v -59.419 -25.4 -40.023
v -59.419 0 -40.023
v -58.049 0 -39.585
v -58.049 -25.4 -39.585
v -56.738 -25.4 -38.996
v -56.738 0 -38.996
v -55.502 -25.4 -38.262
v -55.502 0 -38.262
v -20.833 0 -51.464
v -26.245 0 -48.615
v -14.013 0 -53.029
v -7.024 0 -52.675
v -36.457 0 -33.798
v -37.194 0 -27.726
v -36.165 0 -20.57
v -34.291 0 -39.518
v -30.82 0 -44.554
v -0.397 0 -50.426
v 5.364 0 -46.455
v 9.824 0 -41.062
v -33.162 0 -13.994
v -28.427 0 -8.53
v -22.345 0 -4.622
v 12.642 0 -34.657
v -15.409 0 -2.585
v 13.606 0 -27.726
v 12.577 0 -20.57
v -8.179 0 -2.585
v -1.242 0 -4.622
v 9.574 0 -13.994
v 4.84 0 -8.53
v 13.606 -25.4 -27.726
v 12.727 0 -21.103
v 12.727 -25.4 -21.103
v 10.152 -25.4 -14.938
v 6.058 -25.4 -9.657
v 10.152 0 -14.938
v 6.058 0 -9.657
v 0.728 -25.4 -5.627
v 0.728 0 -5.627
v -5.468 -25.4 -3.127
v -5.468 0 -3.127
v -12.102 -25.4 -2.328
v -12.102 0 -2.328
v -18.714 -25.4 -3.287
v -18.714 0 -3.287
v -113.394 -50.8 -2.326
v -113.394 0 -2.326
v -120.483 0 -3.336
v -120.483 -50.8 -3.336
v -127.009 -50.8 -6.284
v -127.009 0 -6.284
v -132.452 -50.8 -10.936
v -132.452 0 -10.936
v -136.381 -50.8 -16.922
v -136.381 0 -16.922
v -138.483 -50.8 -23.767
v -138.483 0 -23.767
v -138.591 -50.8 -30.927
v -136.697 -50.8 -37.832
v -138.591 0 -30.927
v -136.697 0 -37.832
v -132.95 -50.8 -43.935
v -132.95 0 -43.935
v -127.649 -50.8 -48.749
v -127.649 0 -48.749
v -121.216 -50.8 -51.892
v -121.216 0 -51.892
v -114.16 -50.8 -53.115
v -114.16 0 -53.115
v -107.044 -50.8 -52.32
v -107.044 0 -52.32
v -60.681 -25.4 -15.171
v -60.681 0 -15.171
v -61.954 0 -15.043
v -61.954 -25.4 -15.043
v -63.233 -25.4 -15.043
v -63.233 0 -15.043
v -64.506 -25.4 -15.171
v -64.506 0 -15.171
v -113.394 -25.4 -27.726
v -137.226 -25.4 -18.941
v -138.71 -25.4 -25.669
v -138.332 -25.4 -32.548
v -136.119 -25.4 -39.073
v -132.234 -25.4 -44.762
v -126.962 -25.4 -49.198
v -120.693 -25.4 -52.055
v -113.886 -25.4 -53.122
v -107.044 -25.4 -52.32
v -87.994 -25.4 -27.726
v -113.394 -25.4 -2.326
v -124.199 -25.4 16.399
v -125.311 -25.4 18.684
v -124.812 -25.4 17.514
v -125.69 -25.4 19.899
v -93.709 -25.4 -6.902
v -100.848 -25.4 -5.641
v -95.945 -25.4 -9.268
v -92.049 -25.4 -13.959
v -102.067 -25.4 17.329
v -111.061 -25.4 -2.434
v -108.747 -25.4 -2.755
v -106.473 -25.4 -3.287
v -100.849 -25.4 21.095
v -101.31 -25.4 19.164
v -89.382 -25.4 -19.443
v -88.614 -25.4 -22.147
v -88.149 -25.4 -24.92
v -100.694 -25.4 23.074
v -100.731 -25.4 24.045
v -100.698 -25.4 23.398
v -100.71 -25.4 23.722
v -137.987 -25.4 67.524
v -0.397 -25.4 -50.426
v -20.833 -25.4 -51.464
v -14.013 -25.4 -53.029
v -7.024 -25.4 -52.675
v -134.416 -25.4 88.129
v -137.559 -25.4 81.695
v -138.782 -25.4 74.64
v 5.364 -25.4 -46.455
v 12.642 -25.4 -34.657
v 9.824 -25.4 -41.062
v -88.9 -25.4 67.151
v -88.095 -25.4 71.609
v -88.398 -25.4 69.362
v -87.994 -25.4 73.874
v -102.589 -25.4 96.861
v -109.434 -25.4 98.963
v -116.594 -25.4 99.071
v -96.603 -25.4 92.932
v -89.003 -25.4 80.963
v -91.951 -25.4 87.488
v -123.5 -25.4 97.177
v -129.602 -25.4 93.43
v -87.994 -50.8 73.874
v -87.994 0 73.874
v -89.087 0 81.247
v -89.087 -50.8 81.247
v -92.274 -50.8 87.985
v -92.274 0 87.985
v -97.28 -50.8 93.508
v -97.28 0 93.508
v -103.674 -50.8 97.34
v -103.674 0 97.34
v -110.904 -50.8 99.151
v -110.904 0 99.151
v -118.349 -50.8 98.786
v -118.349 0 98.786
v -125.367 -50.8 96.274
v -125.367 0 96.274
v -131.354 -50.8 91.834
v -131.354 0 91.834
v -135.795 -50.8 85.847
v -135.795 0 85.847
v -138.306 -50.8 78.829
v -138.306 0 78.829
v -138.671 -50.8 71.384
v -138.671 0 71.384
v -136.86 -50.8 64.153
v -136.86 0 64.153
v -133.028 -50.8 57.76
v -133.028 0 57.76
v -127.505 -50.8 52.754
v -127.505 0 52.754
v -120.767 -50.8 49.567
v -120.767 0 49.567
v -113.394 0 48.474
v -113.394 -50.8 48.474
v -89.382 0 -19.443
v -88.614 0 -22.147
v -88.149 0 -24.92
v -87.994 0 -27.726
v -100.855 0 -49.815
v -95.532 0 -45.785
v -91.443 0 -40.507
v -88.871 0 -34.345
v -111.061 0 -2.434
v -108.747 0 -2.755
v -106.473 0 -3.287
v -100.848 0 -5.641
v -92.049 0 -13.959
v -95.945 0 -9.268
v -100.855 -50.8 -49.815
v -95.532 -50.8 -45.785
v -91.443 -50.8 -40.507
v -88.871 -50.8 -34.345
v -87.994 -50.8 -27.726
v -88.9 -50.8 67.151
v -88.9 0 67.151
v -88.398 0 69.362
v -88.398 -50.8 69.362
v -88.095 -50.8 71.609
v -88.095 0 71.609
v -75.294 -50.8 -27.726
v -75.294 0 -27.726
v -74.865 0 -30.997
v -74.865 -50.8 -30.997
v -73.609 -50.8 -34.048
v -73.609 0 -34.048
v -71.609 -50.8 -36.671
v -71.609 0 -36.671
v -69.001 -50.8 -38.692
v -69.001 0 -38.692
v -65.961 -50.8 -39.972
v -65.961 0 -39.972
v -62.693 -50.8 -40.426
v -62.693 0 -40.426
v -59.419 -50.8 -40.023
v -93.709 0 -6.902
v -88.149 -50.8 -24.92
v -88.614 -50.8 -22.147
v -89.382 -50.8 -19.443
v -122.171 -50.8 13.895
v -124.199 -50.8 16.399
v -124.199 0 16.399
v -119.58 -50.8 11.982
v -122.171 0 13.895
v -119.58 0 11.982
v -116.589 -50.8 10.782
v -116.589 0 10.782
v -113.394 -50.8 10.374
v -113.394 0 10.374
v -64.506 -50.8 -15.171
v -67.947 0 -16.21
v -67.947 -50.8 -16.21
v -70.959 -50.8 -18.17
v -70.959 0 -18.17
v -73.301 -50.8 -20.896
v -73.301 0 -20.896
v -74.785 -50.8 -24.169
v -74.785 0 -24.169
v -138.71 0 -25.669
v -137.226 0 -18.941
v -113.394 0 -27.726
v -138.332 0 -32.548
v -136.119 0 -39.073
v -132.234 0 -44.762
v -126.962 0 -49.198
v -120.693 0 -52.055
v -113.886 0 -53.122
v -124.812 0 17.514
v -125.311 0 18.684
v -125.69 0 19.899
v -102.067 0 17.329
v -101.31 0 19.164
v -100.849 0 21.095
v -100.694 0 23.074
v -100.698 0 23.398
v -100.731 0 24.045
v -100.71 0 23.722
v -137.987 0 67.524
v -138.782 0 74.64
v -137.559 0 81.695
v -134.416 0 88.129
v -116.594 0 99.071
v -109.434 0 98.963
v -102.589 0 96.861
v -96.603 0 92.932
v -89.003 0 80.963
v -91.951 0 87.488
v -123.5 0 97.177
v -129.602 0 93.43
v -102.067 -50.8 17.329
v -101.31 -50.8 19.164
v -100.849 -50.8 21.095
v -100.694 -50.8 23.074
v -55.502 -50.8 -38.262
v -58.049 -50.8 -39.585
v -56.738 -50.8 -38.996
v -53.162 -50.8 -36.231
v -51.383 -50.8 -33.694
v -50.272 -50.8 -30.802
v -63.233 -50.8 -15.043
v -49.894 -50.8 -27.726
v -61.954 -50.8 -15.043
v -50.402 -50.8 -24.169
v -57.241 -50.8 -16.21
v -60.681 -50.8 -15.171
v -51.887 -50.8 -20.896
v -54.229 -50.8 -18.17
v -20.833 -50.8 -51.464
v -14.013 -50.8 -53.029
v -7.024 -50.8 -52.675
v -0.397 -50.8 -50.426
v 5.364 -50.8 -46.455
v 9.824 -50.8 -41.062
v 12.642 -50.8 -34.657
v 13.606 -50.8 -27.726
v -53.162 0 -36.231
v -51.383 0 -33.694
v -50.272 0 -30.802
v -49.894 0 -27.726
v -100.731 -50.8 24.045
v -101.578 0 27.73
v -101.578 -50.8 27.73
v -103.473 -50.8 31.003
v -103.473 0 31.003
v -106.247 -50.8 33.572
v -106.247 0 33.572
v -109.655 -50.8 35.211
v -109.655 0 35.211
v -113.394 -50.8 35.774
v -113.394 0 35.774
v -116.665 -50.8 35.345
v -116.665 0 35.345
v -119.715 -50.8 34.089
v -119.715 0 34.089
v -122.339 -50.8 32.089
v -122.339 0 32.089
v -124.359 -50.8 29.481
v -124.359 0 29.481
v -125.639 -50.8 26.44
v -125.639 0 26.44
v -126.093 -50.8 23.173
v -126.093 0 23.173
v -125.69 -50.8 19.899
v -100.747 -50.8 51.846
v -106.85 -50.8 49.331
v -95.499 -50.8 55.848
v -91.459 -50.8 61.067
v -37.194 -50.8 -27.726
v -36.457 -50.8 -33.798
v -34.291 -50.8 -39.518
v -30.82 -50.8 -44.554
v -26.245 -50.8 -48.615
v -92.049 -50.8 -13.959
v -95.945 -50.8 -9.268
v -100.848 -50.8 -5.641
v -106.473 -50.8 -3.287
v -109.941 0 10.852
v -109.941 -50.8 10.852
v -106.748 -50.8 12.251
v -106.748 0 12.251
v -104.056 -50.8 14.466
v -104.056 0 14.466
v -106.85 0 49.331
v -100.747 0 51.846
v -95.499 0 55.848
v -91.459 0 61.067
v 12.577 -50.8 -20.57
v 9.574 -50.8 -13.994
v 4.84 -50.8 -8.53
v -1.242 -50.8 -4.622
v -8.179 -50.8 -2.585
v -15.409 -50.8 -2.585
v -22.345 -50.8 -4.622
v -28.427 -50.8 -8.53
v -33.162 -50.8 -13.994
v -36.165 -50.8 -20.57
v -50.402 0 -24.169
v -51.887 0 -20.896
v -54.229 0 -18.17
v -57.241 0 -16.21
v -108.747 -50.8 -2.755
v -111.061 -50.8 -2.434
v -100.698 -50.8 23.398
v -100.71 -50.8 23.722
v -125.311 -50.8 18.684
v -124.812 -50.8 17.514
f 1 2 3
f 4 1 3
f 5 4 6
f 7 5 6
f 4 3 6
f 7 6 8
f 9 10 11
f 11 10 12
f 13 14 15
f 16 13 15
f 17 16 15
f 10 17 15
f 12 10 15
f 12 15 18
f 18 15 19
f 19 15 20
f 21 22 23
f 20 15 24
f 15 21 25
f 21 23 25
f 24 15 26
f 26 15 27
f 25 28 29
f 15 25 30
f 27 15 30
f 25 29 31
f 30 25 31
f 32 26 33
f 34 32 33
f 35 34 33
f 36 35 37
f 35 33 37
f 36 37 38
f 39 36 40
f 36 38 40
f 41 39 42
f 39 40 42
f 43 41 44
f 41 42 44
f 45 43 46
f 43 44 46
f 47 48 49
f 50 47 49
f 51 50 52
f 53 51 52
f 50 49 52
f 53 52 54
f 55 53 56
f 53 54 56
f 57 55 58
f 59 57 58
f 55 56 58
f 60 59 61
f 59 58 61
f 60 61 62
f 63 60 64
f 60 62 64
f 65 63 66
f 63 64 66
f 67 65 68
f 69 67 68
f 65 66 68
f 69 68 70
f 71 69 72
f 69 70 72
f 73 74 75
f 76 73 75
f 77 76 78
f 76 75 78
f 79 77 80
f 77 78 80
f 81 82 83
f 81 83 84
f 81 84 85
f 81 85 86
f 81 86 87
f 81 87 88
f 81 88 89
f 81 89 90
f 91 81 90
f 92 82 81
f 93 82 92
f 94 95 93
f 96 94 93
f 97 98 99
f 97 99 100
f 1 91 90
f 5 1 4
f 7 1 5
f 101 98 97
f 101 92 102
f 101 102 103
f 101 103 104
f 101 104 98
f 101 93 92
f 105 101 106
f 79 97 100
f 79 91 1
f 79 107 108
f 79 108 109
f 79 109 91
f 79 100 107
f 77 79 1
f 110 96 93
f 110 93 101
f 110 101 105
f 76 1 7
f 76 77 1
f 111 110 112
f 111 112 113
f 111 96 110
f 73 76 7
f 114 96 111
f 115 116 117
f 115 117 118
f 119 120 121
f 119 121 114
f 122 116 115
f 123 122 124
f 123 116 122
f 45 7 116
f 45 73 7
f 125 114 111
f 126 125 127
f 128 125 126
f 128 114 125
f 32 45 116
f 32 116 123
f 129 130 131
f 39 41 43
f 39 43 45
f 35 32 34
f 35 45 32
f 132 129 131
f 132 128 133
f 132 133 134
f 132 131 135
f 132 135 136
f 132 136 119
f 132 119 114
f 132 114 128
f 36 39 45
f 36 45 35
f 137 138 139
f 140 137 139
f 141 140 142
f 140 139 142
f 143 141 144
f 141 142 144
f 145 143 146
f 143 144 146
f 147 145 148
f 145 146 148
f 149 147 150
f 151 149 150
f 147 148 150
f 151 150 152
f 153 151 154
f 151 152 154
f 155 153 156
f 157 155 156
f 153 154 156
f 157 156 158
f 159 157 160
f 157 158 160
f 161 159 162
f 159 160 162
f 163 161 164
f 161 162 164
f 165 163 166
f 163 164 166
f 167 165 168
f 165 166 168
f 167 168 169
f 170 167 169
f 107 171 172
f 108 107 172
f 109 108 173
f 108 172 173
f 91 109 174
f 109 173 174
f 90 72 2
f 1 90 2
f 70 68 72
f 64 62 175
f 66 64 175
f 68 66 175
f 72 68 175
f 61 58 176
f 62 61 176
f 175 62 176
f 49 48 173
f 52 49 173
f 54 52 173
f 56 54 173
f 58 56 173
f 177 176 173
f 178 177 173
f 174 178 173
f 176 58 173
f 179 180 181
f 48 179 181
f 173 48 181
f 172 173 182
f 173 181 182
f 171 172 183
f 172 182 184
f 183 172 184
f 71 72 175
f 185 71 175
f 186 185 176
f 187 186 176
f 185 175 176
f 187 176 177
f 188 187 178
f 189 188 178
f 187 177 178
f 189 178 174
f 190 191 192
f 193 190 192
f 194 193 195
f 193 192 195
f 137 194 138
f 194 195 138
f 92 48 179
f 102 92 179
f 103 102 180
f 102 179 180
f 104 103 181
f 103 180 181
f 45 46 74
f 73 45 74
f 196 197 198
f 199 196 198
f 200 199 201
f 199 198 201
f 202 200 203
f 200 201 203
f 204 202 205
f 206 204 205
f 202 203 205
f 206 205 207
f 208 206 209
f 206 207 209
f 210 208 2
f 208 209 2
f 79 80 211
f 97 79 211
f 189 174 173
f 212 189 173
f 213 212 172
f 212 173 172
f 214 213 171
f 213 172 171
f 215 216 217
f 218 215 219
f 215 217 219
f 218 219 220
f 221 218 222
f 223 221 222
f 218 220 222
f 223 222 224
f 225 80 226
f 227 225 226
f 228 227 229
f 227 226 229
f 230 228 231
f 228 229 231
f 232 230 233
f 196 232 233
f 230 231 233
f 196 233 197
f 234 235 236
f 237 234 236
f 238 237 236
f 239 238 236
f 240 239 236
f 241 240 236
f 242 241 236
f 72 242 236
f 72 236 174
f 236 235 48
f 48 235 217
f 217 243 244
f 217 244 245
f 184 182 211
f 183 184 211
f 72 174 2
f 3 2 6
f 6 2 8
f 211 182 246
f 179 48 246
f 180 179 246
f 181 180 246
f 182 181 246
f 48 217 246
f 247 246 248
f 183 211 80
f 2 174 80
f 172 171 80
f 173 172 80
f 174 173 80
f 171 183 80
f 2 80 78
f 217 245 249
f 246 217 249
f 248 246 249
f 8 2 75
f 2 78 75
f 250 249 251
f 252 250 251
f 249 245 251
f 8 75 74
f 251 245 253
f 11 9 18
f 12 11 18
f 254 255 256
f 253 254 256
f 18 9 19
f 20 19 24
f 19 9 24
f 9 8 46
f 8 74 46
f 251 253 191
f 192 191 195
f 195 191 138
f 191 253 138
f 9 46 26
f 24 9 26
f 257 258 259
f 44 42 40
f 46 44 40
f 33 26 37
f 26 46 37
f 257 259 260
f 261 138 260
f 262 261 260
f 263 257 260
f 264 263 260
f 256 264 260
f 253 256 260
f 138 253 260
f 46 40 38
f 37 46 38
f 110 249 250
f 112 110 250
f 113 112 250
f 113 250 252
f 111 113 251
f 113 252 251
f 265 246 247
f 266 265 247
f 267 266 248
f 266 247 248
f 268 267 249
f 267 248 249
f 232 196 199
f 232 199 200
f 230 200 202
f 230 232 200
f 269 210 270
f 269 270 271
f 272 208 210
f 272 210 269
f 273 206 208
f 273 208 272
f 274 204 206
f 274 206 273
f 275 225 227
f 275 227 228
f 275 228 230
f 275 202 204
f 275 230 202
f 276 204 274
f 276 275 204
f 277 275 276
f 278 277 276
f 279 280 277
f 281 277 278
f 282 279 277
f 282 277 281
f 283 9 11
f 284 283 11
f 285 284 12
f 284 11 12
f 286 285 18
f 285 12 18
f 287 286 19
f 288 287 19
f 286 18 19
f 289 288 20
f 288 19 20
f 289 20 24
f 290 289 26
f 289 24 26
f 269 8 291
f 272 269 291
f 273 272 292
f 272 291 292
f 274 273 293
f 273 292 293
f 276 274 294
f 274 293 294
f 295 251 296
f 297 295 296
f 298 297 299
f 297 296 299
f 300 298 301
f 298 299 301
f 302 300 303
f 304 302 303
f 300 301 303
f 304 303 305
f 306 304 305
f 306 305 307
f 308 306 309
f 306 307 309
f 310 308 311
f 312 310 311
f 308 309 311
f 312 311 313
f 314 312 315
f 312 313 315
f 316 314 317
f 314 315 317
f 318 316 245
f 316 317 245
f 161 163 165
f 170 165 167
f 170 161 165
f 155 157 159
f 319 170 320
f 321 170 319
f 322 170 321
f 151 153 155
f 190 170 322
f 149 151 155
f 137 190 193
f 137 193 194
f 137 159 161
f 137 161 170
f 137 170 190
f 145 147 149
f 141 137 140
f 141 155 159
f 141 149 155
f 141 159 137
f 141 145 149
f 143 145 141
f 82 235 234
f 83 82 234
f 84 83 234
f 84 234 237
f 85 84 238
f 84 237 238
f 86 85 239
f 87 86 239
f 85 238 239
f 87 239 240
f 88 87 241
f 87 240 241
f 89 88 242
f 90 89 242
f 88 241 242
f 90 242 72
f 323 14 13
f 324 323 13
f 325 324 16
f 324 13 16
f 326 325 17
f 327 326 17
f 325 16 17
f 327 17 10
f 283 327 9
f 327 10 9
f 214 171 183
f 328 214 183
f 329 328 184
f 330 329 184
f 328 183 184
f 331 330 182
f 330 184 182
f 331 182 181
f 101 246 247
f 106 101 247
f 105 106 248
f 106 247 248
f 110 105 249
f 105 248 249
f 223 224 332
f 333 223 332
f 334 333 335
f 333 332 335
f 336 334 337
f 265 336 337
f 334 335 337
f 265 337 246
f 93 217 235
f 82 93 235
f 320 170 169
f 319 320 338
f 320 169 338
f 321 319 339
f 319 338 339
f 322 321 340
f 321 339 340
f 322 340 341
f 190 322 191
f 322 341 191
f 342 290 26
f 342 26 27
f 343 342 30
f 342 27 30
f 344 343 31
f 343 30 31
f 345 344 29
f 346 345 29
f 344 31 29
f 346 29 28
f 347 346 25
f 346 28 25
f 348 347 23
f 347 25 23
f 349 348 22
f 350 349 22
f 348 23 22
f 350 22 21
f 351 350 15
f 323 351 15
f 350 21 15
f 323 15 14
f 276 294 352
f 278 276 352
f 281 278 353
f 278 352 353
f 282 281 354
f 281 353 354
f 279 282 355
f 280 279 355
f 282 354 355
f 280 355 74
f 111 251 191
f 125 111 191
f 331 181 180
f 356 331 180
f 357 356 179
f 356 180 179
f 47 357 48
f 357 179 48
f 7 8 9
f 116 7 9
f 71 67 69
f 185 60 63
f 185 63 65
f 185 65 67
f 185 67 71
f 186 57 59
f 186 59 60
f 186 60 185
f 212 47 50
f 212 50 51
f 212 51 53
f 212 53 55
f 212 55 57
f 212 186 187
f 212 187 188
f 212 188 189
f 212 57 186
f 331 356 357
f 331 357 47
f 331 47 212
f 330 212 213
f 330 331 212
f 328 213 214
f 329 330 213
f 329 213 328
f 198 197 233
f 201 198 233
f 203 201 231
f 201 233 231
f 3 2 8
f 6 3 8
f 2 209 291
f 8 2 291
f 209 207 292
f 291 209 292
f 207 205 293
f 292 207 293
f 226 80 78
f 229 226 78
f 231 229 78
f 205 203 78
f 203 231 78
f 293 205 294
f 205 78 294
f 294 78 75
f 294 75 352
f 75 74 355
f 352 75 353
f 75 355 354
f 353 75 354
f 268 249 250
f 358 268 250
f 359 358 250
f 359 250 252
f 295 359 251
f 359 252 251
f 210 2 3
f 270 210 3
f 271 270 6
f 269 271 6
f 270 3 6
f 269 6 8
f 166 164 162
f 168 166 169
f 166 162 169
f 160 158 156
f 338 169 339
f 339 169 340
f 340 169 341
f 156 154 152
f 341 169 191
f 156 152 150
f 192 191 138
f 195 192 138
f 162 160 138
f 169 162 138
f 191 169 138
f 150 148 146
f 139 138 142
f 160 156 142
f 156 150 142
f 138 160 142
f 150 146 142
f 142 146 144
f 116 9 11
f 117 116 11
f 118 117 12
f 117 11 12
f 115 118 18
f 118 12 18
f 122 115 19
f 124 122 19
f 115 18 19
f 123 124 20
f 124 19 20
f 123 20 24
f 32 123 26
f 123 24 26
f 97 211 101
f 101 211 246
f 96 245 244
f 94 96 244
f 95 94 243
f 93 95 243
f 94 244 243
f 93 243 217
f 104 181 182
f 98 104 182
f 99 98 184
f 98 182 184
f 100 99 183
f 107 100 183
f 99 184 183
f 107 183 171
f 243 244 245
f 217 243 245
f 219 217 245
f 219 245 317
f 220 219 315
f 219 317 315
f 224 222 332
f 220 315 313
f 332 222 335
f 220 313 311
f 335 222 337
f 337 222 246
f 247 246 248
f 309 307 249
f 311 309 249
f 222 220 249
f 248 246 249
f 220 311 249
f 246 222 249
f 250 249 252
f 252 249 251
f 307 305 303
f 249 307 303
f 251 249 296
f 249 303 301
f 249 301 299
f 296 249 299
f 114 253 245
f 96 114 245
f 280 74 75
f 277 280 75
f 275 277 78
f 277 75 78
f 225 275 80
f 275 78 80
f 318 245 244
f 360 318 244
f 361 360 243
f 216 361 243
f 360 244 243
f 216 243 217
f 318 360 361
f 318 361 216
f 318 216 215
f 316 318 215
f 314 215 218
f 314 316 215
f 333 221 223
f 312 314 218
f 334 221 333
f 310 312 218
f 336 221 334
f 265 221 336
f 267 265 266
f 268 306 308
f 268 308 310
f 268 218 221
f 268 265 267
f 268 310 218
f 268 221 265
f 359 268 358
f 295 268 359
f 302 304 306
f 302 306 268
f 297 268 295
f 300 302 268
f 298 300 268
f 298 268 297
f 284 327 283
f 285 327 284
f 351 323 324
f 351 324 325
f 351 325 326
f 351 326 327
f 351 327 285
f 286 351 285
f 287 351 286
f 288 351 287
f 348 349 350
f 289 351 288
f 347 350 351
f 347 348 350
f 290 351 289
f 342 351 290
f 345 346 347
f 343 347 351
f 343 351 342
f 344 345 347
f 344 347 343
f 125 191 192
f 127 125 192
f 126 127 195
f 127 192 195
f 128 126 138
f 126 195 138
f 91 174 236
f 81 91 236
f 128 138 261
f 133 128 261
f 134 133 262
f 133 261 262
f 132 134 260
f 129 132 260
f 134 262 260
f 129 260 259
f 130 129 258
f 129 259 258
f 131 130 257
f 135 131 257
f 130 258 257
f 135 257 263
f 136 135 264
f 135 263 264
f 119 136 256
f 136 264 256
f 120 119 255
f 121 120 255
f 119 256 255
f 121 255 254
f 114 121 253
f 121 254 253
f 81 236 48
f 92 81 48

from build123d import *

# Parameters (mm, degrees)
F1_DEPTH = 50.8
F2_DEPTH = 25.4


with BuildPart() as f1:
    # F0 (on Front) → F1 (new body)
    with BuildSketch(Plane.XZ):
        with BuildLine():
            ThreePointArc((-137.9871743623, 67.5235991138), (-128.9479899805, 53.7931359717), (-113.3937301139, 48.4735991138))
            ThreePointArc((-113.3937301139, 48.4735991138), (-97.9925024501, 53.6755252836), (-88.8996251196, 67.1505923067))
            ThreePointArc((-88.8996251196, 67.1505923067), (-88.221222622, 70.4817166612), (-87.9937301139, 73.8735991138))
            ThreePointArc((-87.9937301139, 73.8735991138), (-116.5942391429, 99.071153399), (-137.9871743623, 67.5235991138))
        make_face()
    extrude(amount=F1_DEPTH)


with BuildPart() as f1b:
    # F0 (on Front) → F1, piece 2 (new body)
    with BuildSketch(Plane.XZ):
        with BuildLine():
            Line((-113.3937301139, 23.0735991138), (-113.3937301139, 35.7735991138))
            ThreePointArc((-113.3937301139, 35.7735991138), (-123.4339616849, 30.8507290471), (-125.6904522381, 19.8985991138))
            ThreePointArc((-125.6904522381, 19.8985991138), (-125.0762783357, 18.0928293896), (-124.1985960163, 16.3994045683))
            ThreePointArc((-124.1985960163, 16.3994045683), (-119.5795093401, 11.9818843968), (-113.3937301139, 10.3735991138))
            Line((-113.3937301139, 10.3735991138), (-113.3937301139, 23.0735991138))
        make_face()
        with BuildLine():
            ThreePointArc((-100.73095144, 24.0452143962), (-104.7638261192, 32.3910428106), (-113.3937301139, 35.7735991138))
            Line((-113.3937301139, 35.7735991138), (-113.3937301139, 23.0735991138))
            Line((-113.3937301139, 23.0735991138), (-113.3937301139, 10.3735991138))
            ThreePointArc((-113.3937301139, 10.3735991138), (-106.7479444034, 12.2512365117), (-102.0672572423, 17.3289483594))
            ThreePointArc((-102.0672572423, 17.3289483594), (-101.0418839873, 20.1203132716), (-100.6937301139, 23.0735991138))
            ThreePointArc((-100.6937301139, 23.0735991138), (-100.7030388569, 23.5597630995), (-100.73095144, 24.0452143962))
        make_face()
    extrude(amount=F1_DEPTH)


with BuildPart() as f1c:
    # F0 (on Front) → F1, piece 3 (new body)
    with BuildSketch(Plane.XZ):
        with BuildLine():
            Line((-113.3937301139, -27.7263897808), (-113.3937301139, -2.3263897808))
            ThreePointArc((-113.3937301139, -2.3263897808), (-127.919833657, -6.890067748), (-137.2260585632, -18.94116806))
            ThreePointArc((-137.2260585632, -18.94116806), (-132.2336289319, -44.7621818823), (-107.0437301139, -52.3198340292))
            ThreePointArc((-107.0437301139, -52.3198340292), (-93.3132669718, -43.2806496474), (-87.9937301139, -27.7263897808))
            Line((-87.9937301139, -27.7263897808), (-113.3937301139, -27.7263897808))
        make_face()
        with BuildLine():
            ThreePointArc((-106.473283211, -3.2873346709), (-109.9003077082, -2.5677729687), (-113.3937301139, -2.3263897808))
            Line((-113.3937301139, -2.3263897808), (-113.3937301139, -27.7263897808))
            Line((-113.3937301139, -27.7263897808), (-87.9937301139, -27.7263897808))
            ThreePointArc((-87.9937301139, -27.7263897808), (-88.3432635278, -23.5270893845), (-89.3822438003, -19.4433634609))
            ThreePointArc((-89.3822438003, -19.4433634609), (-95.945221877, -9.2680702389), (-106.473283211, -3.2873346709))
        make_face()
    extrude(amount=F1_DEPTH)


with BuildPart() as f1d:
    # F0 (on Front) → F1, piece 4 (new body)
    with BuildSketch(Plane.XZ):
        with BuildLine():
            ThreePointArc((-60.6812406189, -15.1712161885), (-62.5937301139, -15.0263897808), (-64.5062196088, -15.1712161885))
            ThreePointArc((-64.5062196088, -15.1712161885), (-72.2264508247, -19.4498753147), (-75.2937301139, -27.7263897808))
            Line((-75.2937301139, -27.7263897808), (-62.5937301139, -27.7263897808))
            Line((-62.5937301139, -27.7263897808), (-49.8937301139, -27.7263897808))
            ThreePointArc((-49.8937301139, -27.7263897808), (-52.961009403, -19.4498753147), (-60.6812406189, -15.1712161885))
        make_face()
        with BuildLine():
            ThreePointArc((-75.2937301139, -27.7263897808), (-70.3708600472, -37.7666213518), (-59.4187301139, -40.023111905))
            ThreePointArc((-59.4187301139, -40.023111905), (-57.3852437316, -39.309207642), (-55.5017480057, -38.2617488054))
            ThreePointArc((-55.5017480057, -38.2617488054), (-51.3830616955, -33.6938778296), (-49.8937301139, -27.7263897808))
            Line((-49.8937301139, -27.7263897808), (-62.5937301139, -27.7263897808))
            Line((-62.5937301139, -27.7263897808), (-75.2937301139, -27.7263897808))
        make_face()
    extrude(amount=F1_DEPTH)


with BuildPart() as f1e:
    # F0 (on Front) → F1, piece 5 (new body)
    with BuildSketch(Plane.XZ):
        with BuildLine():
            ThreePointArc((13.6062698861, -27.7263897808), (3.5258757666, -7.4663385551), (-18.7141770167, -3.2873346709))
            ThreePointArc((-18.7141770167, -3.2873346709), (-32.0537813395, -12.4067839003), (-37.1937301139, -27.7263897808))
            ThreePointArc((-37.1937301139, -27.7263897808), (-32.7072718404, -42.1410965919), (-20.8328031491, -51.4636002037))
            ThreePointArc((-20.8328031491, -51.4636002037), (2.6209766973, -48.6399315073), (13.6062698861, -27.7263897808))
        make_face()
    extrude(amount=F1_DEPTH)


with BuildPart() as f2:
    # F0 (on Front) → F2 (new body)
    with BuildSketch(Plane.XZ):
        with BuildLine():
            ThreePointArc((-88.8996251196, 67.1505923067), (-97.9925024501, 53.6755252836), (-113.3937301139, 48.4735991138))
            Line((-113.3937301139, 48.4735991138), (-113.3937301139, 35.7735991138))
            ThreePointArc((-113.3937301139, 35.7735991138), (-104.7638261192, 32.3910428106), (-100.73095144, 24.0452143962))
            Line((-100.73095144, 24.0452143962), (-88.8996251196, 67.1505923067))
        make_face()
        with BuildLine():
            Line((-113.3937301139, 35.7735991138), (-113.3937301139, 48.4735991138))
            ThreePointArc((-113.3937301139, 48.4735991138), (-128.9479899805, 53.7931359717), (-137.9871743623, 67.5235991138))
            Line((-137.9871743623, 67.5235991138), (-125.6904522381, 19.8985991138))
            ThreePointArc((-125.6904522381, 19.8985991138), (-123.4339616849, 30.8507290471), (-113.3937301139, 35.7735991138))
        make_face()
        with BuildLine():
            ThreePointArc((-137.9871743623, 67.5235991138), (-128.9479899805, 53.7931359717), (-113.3937301139, 48.4735991138))
            ThreePointArc((-113.3937301139, 48.4735991138), (-97.9925024501, 53.6755252836), (-88.8996251196, 67.1505923067))
            ThreePointArc((-88.8996251196, 67.1505923067), (-88.221222622, 70.4817166612), (-87.9937301139, 73.8735991138))
            ThreePointArc((-87.9937301139, 73.8735991138), (-116.5942391429, 99.071153399), (-137.9871743623, 67.5235991138))
        make_face()
        with BuildLine():
            ThreePointArc((-100.73095144, 24.0452143962), (-104.7638261192, 32.3910428106), (-113.3937301139, 35.7735991138))
            Line((-113.3937301139, 35.7735991138), (-113.3937301139, 23.0735991138))
            Line((-113.3937301139, 23.0735991138), (-113.3937301139, 10.3735991138))
            ThreePointArc((-113.3937301139, 10.3735991138), (-106.7479444034, 12.2512365117), (-102.0672572423, 17.3289483594))
            ThreePointArc((-102.0672572423, 17.3289483594), (-101.0418839873, 20.1203132716), (-100.6937301139, 23.0735991138))
            ThreePointArc((-100.6937301139, 23.0735991138), (-100.7030388569, 23.5597630995), (-100.73095144, 24.0452143962))
        make_face()
        with BuildLine():
            Line((-113.3937301139, 23.0735991138), (-113.3937301139, 35.7735991138))
            ThreePointArc((-113.3937301139, 35.7735991138), (-123.4339616849, 30.8507290471), (-125.6904522381, 19.8985991138))
            ThreePointArc((-125.6904522381, 19.8985991138), (-125.0762783357, 18.0928293896), (-124.1985960163, 16.3994045683))
            ThreePointArc((-124.1985960163, 16.3994045683), (-119.5795093401, 11.9818843968), (-113.3937301139, 10.3735991138))
            Line((-113.3937301139, 10.3735991138), (-113.3937301139, 23.0735991138))
        make_face()
        with BuildLine():
            ThreePointArc((-102.0672572423, 17.3289483594), (-106.7479444034, 12.2512365117), (-113.3937301139, 10.3735991138))
            Line((-113.3937301139, 10.3735991138), (-113.3937301139, -2.3263897808))
            ThreePointArc((-113.3937301139, -2.3263897808), (-109.9003077082, -2.5677729687), (-106.473283211, -3.2873346709))
            Line((-106.473283211, -3.2873346709), (-93.7085434453, -6.901946749))
            Line((-93.7085434453, -6.901946749), (-102.0672572423, 17.3289483594))
        make_face()
        with BuildLine():
            Line((-113.3937301139, -2.3263897808), (-113.3937301139, 10.3735991138))
            ThreePointArc((-113.3937301139, 10.3735991138), (-119.5795093401, 11.9818843968), (-124.1985960163, 16.3994045683))
            Line((-124.1985960163, 16.3994045683), (-137.2260585632, -18.94116806))
            ThreePointArc((-137.2260585632, -18.94116806), (-127.919833657, -6.890067748), (-113.3937301139, -2.3263897808))
        make_face()
        with BuildLine():
            Line((-113.3937301139, -27.7263897808), (-113.3937301139, -2.3263897808))
            ThreePointArc((-113.3937301139, -2.3263897808), (-127.919833657, -6.890067748), (-137.2260585632, -18.94116806))
            ThreePointArc((-137.2260585632, -18.94116806), (-132.2336289319, -44.7621818823), (-107.0437301139, -52.3198340292))
            ThreePointArc((-107.0437301139, -52.3198340292), (-93.3132669718, -43.2806496474), (-87.9937301139, -27.7263897808))
            Line((-87.9937301139, -27.7263897808), (-113.3937301139, -27.7263897808))
        make_face()
        with BuildLine():
            Line((-93.7085434453, -6.901946749), (-106.473283211, -3.2873346709))
            ThreePointArc((-106.473283211, -3.2873346709), (-95.945221877, -9.2680702389), (-89.3822438003, -19.4433634609))
            Line((-89.3822438003, -19.4433634609), (-93.7085434453, -6.901946749))
        make_face()
        with BuildLine():
            Line((-64.5062196088, -15.1712161885), (-93.7085434453, -6.901946749))
            Line((-93.7085434453, -6.901946749), (-89.3822438003, -19.4433634609))
            ThreePointArc((-89.3822438003, -19.4433634609), (-88.3432635278, -23.5270893845), (-87.9937301139, -27.7263897808))
            Line((-87.9937301139, -27.7263897808), (-75.2937301139, -27.7263897808))
            ThreePointArc((-75.2937301139, -27.7263897808), (-72.2264508247, -19.4498753147), (-64.5062196088, -15.1712161885))
        make_face()
        with BuildLine():
            ThreePointArc((-87.9937301139, -27.7263897808), (-93.3132669718, -43.2806496474), (-107.0437301139, -52.3198340292))
            Line((-107.0437301139, -52.3198340292), (-59.4187301139, -40.023111905))
            ThreePointArc((-59.4187301139, -40.023111905), (-70.3708600472, -37.7666213518), (-75.2937301139, -27.7263897808))
            Line((-75.2937301139, -27.7263897808), (-87.9937301139, -27.7263897808))
        make_face()
        with BuildLine():
            ThreePointArc((-60.6812406189, -15.1712161885), (-62.5937301139, -15.0263897808), (-64.5062196088, -15.1712161885))
            ThreePointArc((-64.5062196088, -15.1712161885), (-72.2264508247, -19.4498753147), (-75.2937301139, -27.7263897808))
            Line((-75.2937301139, -27.7263897808), (-62.5937301139, -27.7263897808))
            Line((-62.5937301139, -27.7263897808), (-49.8937301139, -27.7263897808))
            ThreePointArc((-49.8937301139, -27.7263897808), (-52.961009403, -19.4498753147), (-60.6812406189, -15.1712161885))
        make_face()
        with BuildLine():
            ThreePointArc((-75.2937301139, -27.7263897808), (-70.3708600472, -37.7666213518), (-59.4187301139, -40.023111905))
            ThreePointArc((-59.4187301139, -40.023111905), (-57.3852437316, -39.309207642), (-55.5017480057, -38.2617488054))
            ThreePointArc((-55.5017480057, -38.2617488054), (-51.3830616955, -33.6938778296), (-49.8937301139, -27.7263897808))
            Line((-49.8937301139, -27.7263897808), (-62.5937301139, -27.7263897808))
            Line((-62.5937301139, -27.7263897808), (-75.2937301139, -27.7263897808))
        make_face()
        with BuildLine():
            Line((-18.7141770167, -3.2873346709), (-60.6812406189, -15.1712161885))
            ThreePointArc((-60.6812406189, -15.1712161885), (-52.961009403, -19.4498753147), (-49.8937301139, -27.7263897808))
            Line((-49.8937301139, -27.7263897808), (-37.1937301139, -27.7263897808))
            ThreePointArc((-37.1937301139, -27.7263897808), (-32.0537813395, -12.4067839003), (-18.7141770167, -3.2873346709))
        make_face()
        with BuildLine():
            ThreePointArc((-49.8937301139, -27.7263897808), (-51.3830616955, -33.6938778296), (-55.5017480057, -38.2617488054))
            Line((-55.5017480057, -38.2617488054), (-20.8328031491, -51.4636002037))
            ThreePointArc((-20.8328031491, -51.4636002037), (-32.7072718404, -42.1410965919), (-37.1937301139, -27.7263897808))
            Line((-37.1937301139, -27.7263897808), (-49.8937301139, -27.7263897808))
        make_face()
        with BuildLine():
            ThreePointArc((13.6062698861, -27.7263897808), (3.5258757666, -7.4663385551), (-18.7141770167, -3.2873346709))
            ThreePointArc((-18.7141770167, -3.2873346709), (-32.0537813395, -12.4067839003), (-37.1937301139, -27.7263897808))
            ThreePointArc((-37.1937301139, -27.7263897808), (-32.7072718404, -42.1410965919), (-20.8328031491, -51.4636002037))
            ThreePointArc((-20.8328031491, -51.4636002037), (2.6209766973, -48.6399315073), (13.6062698861, -27.7263897808))
        make_face()
    extrude(amount=F2_DEPTH)


solid = Compound([f1.part, f1b.part, f1c.part, f1d.part, f1e.part, f2.part])
